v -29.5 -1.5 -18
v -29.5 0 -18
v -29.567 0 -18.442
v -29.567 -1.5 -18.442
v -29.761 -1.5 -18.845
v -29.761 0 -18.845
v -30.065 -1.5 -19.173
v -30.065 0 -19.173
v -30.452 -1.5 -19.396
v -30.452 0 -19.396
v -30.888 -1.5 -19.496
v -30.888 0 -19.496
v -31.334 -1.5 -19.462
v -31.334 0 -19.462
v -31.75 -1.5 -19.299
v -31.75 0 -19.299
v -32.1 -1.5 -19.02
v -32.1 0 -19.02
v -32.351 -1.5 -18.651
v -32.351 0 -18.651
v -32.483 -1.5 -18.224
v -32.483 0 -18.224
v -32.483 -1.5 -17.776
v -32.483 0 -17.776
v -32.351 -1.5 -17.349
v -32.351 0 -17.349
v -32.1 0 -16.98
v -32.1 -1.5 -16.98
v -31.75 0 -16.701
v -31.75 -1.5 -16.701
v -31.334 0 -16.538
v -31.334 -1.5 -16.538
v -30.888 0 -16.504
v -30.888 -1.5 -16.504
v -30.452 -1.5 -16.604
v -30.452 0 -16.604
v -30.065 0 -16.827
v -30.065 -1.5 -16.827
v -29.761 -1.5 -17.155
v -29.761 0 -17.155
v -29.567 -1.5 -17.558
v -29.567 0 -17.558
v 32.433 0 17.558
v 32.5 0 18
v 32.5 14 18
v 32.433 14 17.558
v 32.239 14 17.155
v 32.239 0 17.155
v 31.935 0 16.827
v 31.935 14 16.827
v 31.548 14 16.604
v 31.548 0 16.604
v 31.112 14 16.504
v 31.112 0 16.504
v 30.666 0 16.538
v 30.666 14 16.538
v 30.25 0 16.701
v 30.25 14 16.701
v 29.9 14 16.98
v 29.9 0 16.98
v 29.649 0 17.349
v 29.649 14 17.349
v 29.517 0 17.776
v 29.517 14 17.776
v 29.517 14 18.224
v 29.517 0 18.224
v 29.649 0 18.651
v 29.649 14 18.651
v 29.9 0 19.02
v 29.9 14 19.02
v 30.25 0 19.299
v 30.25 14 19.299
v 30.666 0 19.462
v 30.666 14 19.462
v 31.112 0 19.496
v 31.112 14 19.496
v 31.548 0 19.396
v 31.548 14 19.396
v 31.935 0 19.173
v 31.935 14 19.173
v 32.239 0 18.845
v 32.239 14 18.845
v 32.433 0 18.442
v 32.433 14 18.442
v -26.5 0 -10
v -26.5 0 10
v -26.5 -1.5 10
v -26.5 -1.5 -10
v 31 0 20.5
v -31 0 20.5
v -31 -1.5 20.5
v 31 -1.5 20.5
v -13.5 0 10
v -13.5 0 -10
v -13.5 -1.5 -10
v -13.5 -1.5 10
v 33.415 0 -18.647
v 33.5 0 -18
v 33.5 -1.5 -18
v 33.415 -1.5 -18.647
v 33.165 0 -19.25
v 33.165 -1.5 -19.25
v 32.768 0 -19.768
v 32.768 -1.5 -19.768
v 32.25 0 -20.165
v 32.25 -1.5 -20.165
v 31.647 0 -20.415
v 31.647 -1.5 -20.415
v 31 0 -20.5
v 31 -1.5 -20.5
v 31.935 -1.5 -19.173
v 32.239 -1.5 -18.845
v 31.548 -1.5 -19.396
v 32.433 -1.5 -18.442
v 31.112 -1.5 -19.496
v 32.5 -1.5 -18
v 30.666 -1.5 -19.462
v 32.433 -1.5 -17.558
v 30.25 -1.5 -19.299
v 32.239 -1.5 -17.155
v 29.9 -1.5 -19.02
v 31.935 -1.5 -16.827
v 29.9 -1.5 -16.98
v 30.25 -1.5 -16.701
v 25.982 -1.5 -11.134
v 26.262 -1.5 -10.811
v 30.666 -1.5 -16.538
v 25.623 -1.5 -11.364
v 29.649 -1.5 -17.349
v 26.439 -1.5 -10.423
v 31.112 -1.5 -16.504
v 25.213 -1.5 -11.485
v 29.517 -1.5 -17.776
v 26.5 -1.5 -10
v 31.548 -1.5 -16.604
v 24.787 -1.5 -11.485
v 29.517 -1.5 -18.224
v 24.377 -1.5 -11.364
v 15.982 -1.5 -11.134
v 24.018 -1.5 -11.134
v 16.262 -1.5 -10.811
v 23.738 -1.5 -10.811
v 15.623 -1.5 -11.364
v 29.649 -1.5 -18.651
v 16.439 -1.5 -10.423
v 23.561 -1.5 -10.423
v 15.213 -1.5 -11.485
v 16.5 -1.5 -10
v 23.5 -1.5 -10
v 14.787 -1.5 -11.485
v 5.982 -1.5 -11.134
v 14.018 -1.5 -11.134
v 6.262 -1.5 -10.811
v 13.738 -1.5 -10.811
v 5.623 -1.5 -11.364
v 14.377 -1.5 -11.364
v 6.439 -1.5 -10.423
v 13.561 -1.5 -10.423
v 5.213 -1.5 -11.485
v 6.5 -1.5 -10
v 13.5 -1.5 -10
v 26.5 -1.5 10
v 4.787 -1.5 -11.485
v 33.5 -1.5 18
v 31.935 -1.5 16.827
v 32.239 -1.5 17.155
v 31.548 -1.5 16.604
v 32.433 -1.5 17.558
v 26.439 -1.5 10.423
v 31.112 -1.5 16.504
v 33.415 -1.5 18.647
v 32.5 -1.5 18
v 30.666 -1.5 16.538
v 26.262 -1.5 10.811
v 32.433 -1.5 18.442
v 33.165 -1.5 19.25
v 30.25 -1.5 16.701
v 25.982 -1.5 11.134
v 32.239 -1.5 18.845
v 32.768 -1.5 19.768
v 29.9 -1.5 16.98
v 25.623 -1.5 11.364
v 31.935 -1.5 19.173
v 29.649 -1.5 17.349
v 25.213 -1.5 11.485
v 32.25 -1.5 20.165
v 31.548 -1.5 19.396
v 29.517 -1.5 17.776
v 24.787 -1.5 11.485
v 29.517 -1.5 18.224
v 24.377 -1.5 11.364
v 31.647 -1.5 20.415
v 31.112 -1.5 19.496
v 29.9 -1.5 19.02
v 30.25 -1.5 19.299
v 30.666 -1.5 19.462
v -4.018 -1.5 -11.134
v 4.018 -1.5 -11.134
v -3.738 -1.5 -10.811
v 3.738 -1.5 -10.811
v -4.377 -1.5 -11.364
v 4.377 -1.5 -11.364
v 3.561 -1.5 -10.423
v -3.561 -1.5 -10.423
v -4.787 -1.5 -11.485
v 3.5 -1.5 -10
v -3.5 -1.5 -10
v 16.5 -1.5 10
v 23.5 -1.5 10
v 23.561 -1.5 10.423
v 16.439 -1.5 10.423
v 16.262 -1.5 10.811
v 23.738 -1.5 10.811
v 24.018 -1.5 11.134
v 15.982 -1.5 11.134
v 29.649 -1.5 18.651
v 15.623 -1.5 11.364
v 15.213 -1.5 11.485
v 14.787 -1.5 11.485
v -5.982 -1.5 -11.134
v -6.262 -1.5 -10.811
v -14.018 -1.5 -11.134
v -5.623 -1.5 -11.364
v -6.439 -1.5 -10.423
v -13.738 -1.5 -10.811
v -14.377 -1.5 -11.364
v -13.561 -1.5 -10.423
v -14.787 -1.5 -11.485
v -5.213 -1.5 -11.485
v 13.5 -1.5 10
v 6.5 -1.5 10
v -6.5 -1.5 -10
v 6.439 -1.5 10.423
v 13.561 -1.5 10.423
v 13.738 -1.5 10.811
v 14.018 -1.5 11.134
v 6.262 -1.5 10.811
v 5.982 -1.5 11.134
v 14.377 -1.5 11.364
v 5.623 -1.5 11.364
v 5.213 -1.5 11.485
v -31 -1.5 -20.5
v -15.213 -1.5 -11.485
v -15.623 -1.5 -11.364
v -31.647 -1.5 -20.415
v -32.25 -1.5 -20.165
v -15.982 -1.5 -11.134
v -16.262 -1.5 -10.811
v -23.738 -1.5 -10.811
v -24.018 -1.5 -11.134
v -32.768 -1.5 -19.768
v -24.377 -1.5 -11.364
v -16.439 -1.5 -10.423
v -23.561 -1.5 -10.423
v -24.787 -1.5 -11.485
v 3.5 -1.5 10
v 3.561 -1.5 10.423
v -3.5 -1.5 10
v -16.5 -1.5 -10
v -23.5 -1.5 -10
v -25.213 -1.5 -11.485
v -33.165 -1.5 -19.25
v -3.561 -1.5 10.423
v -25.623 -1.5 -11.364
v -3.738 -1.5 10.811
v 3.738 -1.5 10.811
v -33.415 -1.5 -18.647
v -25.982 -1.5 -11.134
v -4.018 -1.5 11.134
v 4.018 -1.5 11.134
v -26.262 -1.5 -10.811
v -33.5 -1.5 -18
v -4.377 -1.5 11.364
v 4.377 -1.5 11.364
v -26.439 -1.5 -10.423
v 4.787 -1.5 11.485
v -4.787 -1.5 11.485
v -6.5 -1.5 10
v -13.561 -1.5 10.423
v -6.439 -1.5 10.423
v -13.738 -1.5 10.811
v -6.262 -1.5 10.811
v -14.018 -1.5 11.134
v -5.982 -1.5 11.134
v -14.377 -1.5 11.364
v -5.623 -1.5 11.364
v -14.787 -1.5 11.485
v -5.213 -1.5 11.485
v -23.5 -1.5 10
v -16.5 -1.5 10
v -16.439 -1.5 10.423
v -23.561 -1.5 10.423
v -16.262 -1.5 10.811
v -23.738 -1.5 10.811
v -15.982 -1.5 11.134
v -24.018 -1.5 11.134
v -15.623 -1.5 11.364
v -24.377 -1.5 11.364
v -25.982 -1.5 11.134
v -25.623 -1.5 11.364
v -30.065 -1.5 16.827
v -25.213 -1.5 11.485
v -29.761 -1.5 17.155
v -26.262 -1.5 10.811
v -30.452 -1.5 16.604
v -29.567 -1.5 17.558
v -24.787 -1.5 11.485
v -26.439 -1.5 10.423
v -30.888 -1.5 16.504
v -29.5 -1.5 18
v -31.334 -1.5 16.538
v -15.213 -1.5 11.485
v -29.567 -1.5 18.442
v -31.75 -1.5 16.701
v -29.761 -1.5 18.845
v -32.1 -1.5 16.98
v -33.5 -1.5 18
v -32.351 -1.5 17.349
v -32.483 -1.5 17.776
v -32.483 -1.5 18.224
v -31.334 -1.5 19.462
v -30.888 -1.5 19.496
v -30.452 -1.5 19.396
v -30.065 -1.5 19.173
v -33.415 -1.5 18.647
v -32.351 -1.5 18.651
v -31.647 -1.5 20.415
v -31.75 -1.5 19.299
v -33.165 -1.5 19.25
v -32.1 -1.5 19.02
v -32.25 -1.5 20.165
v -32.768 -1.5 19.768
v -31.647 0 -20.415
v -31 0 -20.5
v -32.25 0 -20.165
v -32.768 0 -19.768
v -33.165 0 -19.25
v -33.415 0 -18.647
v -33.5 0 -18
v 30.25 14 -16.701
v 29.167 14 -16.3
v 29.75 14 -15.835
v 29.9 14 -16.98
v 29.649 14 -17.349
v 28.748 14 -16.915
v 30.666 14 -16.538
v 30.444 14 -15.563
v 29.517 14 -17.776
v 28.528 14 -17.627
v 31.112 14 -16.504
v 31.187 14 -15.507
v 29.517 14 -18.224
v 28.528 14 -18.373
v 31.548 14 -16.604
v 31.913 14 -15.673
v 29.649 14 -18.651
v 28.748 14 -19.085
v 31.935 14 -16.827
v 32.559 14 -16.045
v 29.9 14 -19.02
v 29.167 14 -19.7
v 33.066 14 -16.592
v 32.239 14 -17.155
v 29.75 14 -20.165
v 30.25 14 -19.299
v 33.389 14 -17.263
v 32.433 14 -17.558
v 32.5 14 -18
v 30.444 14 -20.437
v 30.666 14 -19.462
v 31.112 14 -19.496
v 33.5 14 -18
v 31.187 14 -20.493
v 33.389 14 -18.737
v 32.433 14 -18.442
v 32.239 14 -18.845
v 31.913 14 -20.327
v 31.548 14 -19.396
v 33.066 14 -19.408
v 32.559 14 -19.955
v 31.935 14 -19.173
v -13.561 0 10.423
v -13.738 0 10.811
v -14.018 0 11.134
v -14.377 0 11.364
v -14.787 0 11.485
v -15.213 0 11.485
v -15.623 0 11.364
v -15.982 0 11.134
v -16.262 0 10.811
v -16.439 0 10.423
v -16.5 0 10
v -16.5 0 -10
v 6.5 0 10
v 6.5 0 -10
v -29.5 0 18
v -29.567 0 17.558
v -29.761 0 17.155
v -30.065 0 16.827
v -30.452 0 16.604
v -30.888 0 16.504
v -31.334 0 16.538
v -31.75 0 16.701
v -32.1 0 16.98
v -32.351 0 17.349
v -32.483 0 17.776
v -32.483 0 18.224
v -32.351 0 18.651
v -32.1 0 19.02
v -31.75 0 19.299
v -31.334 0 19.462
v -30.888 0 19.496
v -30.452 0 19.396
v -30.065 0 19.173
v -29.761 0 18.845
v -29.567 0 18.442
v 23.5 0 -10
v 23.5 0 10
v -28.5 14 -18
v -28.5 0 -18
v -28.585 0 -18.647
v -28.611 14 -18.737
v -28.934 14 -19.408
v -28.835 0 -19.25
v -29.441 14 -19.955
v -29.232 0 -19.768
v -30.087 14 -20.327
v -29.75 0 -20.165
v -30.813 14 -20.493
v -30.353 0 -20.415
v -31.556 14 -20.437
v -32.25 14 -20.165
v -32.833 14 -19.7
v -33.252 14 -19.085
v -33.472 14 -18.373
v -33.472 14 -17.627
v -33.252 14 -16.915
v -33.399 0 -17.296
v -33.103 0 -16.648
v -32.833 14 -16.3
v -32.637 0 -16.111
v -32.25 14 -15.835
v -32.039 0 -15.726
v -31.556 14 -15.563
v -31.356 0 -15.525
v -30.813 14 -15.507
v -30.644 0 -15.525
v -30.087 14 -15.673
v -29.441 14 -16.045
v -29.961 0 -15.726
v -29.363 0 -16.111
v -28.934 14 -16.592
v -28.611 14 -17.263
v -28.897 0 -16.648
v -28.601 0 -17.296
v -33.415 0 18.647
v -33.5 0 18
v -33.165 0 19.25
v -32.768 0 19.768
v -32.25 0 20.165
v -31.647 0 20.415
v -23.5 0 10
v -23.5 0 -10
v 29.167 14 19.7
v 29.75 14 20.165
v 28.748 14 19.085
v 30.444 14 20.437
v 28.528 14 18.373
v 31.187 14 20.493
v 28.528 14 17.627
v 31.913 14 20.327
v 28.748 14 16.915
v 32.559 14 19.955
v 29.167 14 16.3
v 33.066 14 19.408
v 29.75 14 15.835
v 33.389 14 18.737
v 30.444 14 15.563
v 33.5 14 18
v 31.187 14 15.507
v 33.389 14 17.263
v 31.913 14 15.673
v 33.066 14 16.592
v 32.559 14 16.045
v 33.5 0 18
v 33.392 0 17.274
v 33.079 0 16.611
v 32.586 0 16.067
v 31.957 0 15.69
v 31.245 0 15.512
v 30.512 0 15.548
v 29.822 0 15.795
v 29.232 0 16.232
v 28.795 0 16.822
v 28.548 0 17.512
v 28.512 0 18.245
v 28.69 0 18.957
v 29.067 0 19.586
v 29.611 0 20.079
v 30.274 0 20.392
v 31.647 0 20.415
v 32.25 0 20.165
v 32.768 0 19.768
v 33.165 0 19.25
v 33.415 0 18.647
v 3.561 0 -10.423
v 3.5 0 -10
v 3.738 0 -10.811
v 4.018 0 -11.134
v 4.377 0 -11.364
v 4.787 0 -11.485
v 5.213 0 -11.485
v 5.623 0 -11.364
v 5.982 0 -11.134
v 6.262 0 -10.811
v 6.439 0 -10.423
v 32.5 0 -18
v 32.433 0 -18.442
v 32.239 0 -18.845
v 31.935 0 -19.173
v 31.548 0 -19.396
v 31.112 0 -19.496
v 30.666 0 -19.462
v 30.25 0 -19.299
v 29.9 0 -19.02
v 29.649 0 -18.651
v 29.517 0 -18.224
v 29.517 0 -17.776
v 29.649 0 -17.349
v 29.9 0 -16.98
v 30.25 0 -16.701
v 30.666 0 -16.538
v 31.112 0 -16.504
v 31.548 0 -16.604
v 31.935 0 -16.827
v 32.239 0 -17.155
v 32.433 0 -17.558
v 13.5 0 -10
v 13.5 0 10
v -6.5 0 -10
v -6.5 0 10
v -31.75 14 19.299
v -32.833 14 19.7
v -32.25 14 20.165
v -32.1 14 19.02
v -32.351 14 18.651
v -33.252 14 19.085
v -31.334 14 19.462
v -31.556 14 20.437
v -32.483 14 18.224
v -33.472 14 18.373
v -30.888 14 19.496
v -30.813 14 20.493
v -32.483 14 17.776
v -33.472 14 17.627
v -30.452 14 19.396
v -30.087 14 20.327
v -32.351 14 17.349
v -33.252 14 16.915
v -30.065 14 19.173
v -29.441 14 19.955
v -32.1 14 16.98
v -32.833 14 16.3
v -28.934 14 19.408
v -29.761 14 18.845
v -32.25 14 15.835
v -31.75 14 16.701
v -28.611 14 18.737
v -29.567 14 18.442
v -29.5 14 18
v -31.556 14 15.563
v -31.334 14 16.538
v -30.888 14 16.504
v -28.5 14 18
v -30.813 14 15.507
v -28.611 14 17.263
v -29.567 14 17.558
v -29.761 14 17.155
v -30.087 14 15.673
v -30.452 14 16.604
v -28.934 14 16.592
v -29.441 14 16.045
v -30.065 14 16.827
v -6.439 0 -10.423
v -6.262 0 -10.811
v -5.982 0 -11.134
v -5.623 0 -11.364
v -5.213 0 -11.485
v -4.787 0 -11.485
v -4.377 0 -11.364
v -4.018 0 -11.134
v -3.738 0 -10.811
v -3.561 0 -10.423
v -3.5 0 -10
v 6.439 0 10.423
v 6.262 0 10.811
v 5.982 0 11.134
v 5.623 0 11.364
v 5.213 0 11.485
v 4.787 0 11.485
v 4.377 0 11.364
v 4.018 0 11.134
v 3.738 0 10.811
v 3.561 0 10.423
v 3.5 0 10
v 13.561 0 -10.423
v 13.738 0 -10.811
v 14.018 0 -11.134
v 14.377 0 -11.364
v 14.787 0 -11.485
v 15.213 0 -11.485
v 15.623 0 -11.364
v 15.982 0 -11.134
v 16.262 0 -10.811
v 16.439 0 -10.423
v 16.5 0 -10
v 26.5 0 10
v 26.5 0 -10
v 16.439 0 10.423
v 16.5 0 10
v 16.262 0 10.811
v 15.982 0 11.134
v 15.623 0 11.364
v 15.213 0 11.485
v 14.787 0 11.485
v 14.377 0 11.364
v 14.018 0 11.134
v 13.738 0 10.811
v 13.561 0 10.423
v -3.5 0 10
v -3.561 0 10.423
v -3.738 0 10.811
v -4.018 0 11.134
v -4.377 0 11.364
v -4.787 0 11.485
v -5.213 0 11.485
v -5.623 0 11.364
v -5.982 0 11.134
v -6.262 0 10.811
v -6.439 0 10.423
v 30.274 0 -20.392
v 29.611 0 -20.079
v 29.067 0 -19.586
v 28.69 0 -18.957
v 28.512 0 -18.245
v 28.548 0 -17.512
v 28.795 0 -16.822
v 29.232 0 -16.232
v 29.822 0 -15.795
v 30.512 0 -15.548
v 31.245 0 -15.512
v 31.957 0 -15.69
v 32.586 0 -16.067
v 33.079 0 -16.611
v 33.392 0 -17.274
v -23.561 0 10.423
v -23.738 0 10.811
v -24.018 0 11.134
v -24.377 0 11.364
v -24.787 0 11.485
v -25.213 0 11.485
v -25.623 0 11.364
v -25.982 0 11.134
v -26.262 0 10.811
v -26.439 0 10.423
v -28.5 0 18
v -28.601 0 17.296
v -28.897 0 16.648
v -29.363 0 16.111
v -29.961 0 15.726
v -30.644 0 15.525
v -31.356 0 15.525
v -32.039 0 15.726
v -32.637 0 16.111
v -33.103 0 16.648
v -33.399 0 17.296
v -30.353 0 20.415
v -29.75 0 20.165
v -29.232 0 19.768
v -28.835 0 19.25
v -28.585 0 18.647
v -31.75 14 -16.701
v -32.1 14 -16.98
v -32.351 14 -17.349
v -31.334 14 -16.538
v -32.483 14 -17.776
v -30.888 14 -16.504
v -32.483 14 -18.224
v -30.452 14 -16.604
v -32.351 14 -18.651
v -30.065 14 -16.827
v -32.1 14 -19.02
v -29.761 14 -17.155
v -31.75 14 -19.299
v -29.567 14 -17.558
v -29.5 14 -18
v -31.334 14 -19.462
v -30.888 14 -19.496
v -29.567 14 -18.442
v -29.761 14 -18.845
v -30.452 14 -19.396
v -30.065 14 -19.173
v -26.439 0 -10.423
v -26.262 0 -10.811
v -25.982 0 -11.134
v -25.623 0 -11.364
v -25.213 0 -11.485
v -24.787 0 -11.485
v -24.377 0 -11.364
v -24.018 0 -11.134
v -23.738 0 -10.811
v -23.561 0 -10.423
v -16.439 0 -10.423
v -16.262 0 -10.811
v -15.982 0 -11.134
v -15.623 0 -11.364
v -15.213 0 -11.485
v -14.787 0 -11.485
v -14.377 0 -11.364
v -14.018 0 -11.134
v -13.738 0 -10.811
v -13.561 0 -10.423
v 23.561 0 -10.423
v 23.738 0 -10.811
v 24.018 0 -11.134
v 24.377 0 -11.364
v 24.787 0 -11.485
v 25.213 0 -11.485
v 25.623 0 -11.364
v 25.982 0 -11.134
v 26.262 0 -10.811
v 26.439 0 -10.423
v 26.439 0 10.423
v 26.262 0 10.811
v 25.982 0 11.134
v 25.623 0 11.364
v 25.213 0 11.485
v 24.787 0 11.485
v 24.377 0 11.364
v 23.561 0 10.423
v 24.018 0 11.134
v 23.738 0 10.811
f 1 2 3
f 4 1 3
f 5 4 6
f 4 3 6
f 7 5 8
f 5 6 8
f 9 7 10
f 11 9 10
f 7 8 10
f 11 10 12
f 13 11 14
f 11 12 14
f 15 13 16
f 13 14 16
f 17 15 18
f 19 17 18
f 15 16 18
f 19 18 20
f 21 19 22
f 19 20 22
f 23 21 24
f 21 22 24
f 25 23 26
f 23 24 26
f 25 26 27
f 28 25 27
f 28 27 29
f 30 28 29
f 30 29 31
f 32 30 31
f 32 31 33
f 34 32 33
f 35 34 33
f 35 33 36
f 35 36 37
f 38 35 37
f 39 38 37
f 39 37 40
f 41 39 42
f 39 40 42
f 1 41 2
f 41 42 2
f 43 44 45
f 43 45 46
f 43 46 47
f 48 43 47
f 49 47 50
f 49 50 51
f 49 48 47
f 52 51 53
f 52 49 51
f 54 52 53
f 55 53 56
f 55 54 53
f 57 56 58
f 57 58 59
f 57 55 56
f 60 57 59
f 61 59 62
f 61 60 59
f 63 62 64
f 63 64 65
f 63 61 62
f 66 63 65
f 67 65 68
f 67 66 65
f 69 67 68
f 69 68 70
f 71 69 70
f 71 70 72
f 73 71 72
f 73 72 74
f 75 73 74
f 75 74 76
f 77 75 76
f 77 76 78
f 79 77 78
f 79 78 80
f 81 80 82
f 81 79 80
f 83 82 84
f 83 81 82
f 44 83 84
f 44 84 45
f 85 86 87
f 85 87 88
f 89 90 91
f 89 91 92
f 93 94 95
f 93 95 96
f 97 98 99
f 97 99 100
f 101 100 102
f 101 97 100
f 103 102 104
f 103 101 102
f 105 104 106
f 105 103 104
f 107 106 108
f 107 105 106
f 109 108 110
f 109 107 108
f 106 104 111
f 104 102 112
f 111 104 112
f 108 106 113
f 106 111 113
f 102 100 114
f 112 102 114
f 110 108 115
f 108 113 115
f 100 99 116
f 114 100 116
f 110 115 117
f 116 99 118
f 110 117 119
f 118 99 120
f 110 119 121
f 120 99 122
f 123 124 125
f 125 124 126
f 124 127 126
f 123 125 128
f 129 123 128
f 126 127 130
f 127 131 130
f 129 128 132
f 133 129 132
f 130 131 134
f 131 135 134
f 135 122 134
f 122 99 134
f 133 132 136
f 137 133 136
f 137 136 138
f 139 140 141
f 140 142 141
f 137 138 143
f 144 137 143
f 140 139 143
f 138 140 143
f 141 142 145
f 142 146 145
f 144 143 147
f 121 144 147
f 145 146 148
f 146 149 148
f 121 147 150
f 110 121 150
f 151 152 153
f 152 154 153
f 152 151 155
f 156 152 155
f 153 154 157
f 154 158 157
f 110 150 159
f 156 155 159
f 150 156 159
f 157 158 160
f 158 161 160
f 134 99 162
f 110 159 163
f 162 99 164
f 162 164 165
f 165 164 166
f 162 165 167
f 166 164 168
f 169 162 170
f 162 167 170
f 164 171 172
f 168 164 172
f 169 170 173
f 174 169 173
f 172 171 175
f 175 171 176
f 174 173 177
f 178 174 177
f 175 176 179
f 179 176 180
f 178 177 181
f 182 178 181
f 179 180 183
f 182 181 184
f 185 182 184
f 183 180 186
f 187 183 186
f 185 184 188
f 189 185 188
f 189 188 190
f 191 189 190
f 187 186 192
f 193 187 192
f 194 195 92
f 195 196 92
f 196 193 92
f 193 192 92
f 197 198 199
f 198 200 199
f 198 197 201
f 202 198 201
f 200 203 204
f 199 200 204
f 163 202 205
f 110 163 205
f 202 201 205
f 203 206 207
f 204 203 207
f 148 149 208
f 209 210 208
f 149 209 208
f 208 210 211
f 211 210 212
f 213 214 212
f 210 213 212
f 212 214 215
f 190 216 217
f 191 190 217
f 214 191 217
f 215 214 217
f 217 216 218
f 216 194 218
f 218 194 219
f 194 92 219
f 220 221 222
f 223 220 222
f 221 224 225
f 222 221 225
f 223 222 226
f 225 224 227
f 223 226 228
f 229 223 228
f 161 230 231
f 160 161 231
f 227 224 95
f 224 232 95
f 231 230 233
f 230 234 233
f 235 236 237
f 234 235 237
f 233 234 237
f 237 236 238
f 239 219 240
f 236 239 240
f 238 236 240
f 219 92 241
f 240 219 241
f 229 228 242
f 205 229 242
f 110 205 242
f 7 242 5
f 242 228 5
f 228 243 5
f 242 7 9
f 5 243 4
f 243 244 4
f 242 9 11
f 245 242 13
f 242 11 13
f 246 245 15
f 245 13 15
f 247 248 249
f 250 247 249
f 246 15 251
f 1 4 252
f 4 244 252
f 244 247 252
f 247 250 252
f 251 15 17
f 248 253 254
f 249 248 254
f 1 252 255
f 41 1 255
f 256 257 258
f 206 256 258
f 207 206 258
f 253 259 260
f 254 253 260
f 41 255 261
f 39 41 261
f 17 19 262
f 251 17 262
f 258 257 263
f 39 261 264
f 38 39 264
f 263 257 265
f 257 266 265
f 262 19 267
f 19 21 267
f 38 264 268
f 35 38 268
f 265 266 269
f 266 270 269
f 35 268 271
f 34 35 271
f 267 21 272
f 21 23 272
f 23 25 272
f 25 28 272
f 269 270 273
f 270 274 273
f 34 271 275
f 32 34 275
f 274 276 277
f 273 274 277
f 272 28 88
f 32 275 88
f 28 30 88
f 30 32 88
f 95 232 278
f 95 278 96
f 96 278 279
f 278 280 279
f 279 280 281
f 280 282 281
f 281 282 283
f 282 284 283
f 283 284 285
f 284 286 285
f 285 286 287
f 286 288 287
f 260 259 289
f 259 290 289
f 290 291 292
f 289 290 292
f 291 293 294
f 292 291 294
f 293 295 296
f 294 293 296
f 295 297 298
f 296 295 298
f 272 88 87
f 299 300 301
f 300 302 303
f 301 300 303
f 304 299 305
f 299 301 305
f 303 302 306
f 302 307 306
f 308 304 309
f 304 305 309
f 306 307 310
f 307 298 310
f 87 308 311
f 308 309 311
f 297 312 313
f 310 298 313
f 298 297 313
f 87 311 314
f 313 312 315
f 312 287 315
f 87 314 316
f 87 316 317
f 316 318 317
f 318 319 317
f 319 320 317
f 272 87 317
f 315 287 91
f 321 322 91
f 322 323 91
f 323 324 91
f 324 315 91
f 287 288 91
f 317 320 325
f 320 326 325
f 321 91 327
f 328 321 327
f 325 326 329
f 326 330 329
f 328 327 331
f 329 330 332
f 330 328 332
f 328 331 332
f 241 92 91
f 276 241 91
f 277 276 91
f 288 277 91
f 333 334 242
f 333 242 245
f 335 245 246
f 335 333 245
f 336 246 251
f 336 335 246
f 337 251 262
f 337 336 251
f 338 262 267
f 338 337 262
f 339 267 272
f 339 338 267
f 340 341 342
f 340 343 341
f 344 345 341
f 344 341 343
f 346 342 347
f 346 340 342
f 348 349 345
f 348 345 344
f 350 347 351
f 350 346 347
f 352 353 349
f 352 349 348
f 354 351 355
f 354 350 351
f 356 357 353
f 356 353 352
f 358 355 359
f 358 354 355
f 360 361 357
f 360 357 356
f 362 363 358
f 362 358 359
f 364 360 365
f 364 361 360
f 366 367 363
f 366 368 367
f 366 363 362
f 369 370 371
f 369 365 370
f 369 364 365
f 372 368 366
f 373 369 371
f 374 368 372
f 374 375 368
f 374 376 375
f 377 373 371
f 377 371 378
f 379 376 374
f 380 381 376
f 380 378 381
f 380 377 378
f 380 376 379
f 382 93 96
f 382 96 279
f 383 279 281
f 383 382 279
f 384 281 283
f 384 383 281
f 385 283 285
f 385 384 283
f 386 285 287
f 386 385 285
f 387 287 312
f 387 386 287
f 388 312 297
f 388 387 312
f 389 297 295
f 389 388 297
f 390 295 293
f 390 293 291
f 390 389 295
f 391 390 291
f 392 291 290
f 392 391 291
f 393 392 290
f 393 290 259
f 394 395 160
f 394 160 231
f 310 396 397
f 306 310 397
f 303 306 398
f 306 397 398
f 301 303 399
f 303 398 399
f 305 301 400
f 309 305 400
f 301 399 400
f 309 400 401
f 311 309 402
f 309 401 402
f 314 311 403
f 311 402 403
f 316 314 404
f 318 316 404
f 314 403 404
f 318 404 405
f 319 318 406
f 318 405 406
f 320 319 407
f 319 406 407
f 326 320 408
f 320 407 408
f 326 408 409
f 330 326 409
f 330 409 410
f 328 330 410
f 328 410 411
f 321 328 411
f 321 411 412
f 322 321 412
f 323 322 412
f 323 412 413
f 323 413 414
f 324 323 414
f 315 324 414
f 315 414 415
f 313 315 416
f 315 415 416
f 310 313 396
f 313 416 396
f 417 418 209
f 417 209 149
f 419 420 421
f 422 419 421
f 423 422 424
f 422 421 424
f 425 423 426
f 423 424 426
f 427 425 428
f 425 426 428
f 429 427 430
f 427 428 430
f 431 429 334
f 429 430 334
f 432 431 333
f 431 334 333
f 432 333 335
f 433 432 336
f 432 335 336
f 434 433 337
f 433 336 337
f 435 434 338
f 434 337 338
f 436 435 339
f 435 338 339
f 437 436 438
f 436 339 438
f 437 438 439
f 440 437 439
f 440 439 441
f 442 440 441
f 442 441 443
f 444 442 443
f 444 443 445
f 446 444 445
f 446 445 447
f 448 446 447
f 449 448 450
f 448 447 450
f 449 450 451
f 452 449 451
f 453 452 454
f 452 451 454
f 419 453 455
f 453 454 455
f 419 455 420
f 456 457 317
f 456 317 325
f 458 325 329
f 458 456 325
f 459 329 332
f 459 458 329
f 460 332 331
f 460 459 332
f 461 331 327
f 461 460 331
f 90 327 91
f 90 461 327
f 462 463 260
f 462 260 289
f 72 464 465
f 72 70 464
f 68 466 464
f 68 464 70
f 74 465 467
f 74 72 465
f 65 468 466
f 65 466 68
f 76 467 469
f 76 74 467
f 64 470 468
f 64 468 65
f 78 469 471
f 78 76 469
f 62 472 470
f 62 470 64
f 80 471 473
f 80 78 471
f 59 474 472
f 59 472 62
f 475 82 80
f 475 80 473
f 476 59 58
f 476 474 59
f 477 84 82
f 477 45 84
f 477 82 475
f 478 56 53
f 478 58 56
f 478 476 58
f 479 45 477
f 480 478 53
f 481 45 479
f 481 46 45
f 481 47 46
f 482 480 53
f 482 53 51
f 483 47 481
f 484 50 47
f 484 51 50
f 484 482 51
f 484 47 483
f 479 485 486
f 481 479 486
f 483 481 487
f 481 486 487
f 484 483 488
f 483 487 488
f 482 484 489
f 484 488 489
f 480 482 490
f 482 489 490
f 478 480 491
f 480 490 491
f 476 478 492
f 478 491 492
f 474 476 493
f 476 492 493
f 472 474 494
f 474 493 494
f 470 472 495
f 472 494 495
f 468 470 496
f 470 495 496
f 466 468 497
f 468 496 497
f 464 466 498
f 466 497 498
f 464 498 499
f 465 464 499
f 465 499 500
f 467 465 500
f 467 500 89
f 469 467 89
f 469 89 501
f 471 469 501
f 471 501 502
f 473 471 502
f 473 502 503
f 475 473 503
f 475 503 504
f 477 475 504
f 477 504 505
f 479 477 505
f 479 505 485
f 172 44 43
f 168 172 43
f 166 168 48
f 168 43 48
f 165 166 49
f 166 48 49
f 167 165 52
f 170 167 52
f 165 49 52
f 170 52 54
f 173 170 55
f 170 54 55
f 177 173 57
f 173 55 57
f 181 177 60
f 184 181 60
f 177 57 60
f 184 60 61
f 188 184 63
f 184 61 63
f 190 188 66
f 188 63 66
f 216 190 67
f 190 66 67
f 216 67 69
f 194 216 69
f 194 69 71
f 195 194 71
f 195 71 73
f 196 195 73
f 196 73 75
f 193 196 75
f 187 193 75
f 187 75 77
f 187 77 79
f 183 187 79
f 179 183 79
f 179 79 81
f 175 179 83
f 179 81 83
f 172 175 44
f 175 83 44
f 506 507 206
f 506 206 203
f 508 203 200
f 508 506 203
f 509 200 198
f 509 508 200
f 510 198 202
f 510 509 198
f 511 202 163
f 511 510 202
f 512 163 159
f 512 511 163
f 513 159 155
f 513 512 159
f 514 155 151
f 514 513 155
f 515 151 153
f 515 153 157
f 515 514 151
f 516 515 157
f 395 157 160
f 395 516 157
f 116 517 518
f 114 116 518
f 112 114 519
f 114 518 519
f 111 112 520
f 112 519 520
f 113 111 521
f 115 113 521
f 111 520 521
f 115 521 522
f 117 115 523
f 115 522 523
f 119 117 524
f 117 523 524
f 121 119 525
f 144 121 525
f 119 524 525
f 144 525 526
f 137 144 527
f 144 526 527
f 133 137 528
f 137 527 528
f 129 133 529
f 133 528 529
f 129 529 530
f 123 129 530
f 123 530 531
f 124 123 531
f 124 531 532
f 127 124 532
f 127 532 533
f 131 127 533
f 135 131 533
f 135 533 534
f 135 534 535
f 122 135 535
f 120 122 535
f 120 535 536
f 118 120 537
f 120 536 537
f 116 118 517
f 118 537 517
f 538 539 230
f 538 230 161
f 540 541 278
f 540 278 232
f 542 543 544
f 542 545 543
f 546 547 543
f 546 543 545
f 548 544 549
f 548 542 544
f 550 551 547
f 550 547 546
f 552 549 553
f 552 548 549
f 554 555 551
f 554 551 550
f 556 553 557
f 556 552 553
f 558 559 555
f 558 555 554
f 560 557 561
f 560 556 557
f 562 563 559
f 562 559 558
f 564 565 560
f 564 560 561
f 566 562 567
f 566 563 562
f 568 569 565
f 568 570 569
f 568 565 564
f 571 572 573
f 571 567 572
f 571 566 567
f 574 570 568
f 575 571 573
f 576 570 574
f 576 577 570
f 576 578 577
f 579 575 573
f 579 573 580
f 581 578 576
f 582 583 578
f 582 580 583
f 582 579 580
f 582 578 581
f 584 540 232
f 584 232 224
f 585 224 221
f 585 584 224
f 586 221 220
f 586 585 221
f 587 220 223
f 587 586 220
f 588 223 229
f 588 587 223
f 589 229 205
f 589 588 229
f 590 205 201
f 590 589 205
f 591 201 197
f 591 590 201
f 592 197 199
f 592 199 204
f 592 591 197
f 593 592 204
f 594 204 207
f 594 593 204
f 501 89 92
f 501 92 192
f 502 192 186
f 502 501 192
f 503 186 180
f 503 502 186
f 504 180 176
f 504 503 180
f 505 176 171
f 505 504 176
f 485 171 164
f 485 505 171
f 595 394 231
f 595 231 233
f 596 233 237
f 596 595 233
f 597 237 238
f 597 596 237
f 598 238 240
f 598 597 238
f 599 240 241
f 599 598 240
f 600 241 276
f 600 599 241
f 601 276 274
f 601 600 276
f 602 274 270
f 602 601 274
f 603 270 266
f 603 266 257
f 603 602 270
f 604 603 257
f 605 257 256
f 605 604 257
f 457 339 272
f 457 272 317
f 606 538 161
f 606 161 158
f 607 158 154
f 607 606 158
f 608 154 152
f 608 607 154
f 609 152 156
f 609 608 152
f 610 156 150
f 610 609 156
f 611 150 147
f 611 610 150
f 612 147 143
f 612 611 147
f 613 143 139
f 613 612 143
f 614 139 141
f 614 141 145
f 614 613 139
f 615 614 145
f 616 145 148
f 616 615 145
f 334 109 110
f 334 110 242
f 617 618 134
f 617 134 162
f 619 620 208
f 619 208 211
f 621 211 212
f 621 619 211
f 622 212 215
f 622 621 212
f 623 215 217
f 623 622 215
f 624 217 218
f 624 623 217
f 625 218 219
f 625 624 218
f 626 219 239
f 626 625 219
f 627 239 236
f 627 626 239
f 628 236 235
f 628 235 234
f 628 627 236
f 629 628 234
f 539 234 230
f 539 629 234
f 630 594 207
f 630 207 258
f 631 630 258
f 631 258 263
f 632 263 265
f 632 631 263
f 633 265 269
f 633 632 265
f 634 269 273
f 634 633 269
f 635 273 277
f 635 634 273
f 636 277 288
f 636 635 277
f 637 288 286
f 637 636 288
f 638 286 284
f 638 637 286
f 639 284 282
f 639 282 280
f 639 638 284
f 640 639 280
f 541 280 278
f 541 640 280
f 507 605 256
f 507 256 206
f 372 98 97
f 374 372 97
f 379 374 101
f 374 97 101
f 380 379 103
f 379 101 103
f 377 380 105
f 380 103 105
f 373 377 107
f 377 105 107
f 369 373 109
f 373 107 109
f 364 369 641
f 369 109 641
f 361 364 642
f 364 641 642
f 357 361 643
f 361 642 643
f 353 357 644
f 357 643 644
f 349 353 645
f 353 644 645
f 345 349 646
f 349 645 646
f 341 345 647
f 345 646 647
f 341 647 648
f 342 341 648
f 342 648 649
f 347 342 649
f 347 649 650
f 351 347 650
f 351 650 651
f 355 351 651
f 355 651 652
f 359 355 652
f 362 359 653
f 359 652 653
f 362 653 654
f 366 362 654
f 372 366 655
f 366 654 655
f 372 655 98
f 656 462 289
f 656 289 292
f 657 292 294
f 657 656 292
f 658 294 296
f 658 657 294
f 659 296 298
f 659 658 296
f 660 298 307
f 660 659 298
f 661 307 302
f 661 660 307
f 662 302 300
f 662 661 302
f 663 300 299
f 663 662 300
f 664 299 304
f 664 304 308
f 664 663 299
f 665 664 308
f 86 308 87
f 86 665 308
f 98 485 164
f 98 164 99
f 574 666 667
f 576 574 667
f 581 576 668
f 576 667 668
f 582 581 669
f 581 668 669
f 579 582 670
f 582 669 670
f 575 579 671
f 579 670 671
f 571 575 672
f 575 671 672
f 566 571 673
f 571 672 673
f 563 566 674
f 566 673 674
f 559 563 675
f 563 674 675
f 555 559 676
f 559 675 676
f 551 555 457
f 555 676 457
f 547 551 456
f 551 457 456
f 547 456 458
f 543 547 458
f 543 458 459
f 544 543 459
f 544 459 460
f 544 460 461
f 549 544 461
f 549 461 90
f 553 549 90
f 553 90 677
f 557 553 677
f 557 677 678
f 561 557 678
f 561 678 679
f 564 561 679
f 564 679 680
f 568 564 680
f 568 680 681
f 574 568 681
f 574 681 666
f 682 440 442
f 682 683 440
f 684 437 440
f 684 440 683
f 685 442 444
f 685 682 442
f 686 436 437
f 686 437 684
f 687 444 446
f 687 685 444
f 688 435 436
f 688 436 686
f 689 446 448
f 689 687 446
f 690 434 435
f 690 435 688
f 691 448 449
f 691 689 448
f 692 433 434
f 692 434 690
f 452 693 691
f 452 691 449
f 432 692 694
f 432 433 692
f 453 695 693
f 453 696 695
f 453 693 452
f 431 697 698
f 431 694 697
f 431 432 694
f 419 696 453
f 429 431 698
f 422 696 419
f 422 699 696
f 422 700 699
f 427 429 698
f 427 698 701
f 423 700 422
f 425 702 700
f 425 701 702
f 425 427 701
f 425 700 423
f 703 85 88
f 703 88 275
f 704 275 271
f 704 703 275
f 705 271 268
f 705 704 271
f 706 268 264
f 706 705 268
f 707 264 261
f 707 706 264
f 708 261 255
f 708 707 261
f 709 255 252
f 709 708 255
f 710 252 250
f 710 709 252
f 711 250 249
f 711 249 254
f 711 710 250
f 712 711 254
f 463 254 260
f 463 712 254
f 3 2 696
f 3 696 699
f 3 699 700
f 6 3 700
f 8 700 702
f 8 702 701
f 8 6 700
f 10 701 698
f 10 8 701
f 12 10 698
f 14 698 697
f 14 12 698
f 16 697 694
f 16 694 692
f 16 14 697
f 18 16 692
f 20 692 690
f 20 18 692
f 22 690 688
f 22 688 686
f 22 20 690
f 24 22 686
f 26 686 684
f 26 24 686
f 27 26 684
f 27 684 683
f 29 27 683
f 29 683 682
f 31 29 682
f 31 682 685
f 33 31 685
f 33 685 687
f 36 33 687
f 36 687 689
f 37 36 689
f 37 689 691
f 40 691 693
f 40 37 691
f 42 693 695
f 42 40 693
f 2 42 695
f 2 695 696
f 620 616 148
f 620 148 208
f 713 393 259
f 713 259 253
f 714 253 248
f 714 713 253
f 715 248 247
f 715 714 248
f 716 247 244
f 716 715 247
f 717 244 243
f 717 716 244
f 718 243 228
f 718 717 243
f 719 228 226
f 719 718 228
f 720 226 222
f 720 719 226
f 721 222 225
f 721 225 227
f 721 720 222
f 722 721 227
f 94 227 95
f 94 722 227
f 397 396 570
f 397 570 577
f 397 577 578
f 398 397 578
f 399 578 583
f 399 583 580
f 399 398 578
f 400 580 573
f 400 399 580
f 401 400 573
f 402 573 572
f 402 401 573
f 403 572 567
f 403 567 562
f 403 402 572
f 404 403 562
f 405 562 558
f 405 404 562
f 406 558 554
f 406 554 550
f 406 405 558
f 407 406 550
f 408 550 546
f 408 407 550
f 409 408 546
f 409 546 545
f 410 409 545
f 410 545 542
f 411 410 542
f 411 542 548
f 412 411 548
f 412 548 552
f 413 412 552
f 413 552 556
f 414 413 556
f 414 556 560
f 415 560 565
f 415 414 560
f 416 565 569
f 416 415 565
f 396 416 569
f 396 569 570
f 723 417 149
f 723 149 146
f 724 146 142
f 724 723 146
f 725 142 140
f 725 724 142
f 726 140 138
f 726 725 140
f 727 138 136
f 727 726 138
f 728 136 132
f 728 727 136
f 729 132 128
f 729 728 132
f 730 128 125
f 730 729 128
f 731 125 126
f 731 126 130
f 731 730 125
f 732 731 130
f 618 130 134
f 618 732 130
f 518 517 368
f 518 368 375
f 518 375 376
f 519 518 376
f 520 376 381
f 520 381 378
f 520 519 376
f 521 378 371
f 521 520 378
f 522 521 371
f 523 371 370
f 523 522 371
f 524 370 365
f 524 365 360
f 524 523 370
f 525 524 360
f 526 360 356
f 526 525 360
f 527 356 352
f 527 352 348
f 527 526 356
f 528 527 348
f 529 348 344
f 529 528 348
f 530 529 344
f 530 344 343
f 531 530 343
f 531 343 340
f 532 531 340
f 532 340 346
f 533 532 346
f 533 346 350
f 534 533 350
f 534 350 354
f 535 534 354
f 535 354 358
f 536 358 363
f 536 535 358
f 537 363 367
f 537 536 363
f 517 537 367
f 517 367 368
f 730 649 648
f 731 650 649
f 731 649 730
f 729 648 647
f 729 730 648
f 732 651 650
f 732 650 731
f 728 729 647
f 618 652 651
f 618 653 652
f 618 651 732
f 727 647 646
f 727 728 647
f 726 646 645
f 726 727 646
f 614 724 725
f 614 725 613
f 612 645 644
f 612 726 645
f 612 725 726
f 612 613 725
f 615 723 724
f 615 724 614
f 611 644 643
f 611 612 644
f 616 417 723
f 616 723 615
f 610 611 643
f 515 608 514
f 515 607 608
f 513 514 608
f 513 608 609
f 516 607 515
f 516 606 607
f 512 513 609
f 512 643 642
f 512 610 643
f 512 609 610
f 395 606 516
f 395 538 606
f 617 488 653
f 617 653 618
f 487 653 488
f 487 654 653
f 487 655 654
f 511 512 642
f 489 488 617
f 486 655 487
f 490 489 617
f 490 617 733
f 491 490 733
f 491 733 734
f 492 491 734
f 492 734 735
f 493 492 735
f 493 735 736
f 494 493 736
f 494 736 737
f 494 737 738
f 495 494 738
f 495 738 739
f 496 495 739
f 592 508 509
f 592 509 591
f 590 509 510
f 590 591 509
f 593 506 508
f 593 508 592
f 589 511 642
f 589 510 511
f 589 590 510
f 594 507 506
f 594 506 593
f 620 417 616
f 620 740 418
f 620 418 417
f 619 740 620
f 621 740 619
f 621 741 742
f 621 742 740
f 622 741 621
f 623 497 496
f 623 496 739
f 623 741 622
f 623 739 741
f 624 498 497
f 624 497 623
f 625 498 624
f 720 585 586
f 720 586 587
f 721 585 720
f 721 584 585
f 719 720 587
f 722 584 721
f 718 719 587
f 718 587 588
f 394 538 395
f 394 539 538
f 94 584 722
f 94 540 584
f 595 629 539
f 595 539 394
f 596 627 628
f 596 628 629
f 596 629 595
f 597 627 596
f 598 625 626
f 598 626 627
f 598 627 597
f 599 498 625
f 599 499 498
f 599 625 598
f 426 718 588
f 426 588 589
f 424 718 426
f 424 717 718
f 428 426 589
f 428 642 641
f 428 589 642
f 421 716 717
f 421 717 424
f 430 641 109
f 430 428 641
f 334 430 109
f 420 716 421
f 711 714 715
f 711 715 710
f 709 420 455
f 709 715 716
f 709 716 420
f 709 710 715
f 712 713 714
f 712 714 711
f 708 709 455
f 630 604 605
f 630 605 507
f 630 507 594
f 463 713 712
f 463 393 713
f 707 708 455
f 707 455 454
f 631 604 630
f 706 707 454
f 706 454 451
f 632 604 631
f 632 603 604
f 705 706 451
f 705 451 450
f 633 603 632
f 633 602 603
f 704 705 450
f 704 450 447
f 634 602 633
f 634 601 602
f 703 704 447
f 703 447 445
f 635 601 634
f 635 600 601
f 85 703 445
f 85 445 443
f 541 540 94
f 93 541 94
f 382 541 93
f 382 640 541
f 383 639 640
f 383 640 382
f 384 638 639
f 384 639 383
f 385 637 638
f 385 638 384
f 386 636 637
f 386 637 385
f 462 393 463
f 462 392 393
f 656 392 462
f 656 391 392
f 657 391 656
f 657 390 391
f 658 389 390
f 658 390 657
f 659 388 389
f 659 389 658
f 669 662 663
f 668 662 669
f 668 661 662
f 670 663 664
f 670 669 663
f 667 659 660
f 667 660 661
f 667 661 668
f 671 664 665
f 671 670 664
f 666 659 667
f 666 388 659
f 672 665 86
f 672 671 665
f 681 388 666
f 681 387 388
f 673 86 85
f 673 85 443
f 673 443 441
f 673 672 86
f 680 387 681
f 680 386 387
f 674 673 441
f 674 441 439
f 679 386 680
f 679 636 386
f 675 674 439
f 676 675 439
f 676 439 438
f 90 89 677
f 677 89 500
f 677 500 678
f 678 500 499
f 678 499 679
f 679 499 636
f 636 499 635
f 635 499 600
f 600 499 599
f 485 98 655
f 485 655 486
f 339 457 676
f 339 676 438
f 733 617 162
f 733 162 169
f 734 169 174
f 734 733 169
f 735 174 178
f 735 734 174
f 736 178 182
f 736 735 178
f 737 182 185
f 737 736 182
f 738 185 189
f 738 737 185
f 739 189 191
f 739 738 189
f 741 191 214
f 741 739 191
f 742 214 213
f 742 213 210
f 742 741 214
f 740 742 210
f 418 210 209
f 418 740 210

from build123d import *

# Parameters (mm, degrees)
SKETCH3_R             = 2.5
SKETCH3_R_2           = 1.5
BOSS_EXTRUDE2_DEPTH   = 14
BOSS_EXTRUDE2_2_DEPTH = 14
BOSS_EXTRUDE2_3_DEPTH = 14
BOSS_EXTRUDE2_4_DEPTH = 14
BOSS_EXTRUDE3_DEPTH   = 1.5
SKETCH5_R             = 1.5
CUT_EXTRUDE1_DEPTH    = 1.5
CUT_EXTRUDE2_DEPTH    = 1.5


with BuildPart() as part:
    # Sketch3 → Boss-Extrude2 (new body)
    with BuildSketch(Plane(origin=(0, 0, 0), x_dir=(1, 0, 0), z_dir=(0, 1, 0))):
        with Locations((-31, 18)):
            Circle(SKETCH3_R)
        with Locations((-31, 18)):
            Circle(SKETCH3_R_2, mode=Mode.SUBTRACT)
    extrude(amount=BOSS_EXTRUDE2_DEPTH)



with BuildPart() as body_2:
    # Sketch3 → Boss-Extrude2 2 (new body)
    with BuildSketch(Plane(origin=(0, 0, 0), x_dir=(1, 0, 0), z_dir=(0, 1, 0))):
        with Locations((31, 18)):
            Circle(SKETCH3_R)
        with Locations((31, 18)):
            Circle(SKETCH3_R_2, mode=Mode.SUBTRACT)
    extrude(amount=BOSS_EXTRUDE2_2_DEPTH)


with BuildPart() as body_3:
    # Sketch3 → Boss-Extrude2 3 (new body)
    with BuildSketch(Plane(origin=(0, 0, 0), x_dir=(1, 0, 0), z_dir=(0, 1, 0))):
        with Locations((31, -18)):
            Circle(SKETCH3_R)
        with Locations((31, -18)):
            Circle(SKETCH3_R_2, mode=Mode.SUBTRACT)
    extrude(amount=BOSS_EXTRUDE2_3_DEPTH)


with BuildPart() as body_4:
    # Sketch3 → Boss-Extrude2 4 (new body)
    with BuildSketch(Plane(origin=(0, 0, 0), x_dir=(1, 0, 0), z_dir=(0, 1, 0))):
        with Locations((-31, -18)):
            Circle(SKETCH3_R)
        with Locations((-31, -18)):
            Circle(SKETCH3_R_2, mode=Mode.SUBTRACT)
    extrude(amount=BOSS_EXTRUDE2_4_DEPTH)


with BuildPart() as part_1:
    add(part.part)

    add(body_2.part)  # Boss-Extrude3 merges body 2

    add(body_3.part)  # Boss-Extrude3 merges body 3

    add(body_4.part)  # Boss-Extrude3 merges body 4
    # Sketch4 → Boss-Extrude3 (add)
    with BuildSketch(Plane.XZ):
        with BuildLine():
            Line((-31, 20.5), (31, 20.5))
            ThreePointArc((31, 20.5), (32.767766953, 19.767766953), (33.5, 18))
            Line((33.5, 18), (33.5, -18))
            ThreePointArc((33.5, -18), (32.767766953, -19.767766953), (31, -20.5))
            Line((31, -20.5), (-31, -20.5))
            ThreePointArc((-31, -20.5), (-32.767766953, -19.767766953), (-33.5, -18))
            Line((-33.5, -18), (-33.5, 18))
            ThreePointArc((-33.5, 18), (-32.767766953, 19.767766953), (-31, 20.5))
        make_face()
    extrude(amount=BOSS_EXTRUDE3_DEPTH)

    # Sketch5 → Cut-Extrude1 (cut)
    with BuildSketch(Plane(origin=(0, 0, 0), x_dir=(1, 0, 0), z_dir=(0, 1, 0))):
        with Locations((31, 18)):
            Circle(SKETCH5_R)
        with Locations((-31, 18)):
            Circle(SKETCH5_R)
        with Locations((-31, -18)):
            Circle(SKETCH5_R)
        with Locations((31, -18)):
            Circle(SKETCH5_R)
    extrude(amount=-CUT_EXTRUDE1_DEPTH, mode=Mode.SUBTRACT)

    # Sketch6 → Cut-Extrude2 (cut)
    with BuildSketch(Plane(origin=(0, 0, 0), x_dir=(1, 0, 0), z_dir=(0, 1, 0))):
        with BuildLine():
            Line((-23.5, 10), (-23.5, -10))
            ThreePointArc((-23.5, -10), (-25, -11.5), (-26.5, -10))
            Line((-26.5, -10), (-26.5, 10))
            ThreePointArc((-26.5, 10), (-25, 11.5), (-23.5, 10))
        make_face()
        with BuildLine():
            Line((-13.5, 10), (-13.5, -10))
            ThreePointArc((-13.5, -10), (-15, -11.5), (-16.5, -10))
            Line((-16.5, -10), (-16.5, 10))
            ThreePointArc((-16.5, 10), (-15, 11.5), (-13.5, 10))
        make_face()
        with BuildLine():
            Line((-3.5, 10), (-3.5, -10))
            ThreePointArc((-3.5, -10), (-5, -11.5), (-6.5, -10))
            Line((-6.5, -10), (-6.5, 10))
            ThreePointArc((-6.5, 10), (-5, 11.5), (-3.5, 10))
        make_face()
        with BuildLine():
            Line((6.5, 10), (6.5, -10))
            ThreePointArc((6.5, -10), (5, -11.5), (3.5, -10))
            Line((3.5, -10), (3.5, 10))
            ThreePointArc((3.5, 10), (5, 11.5), (6.5, 10))
        make_face()
        with BuildLine():
            Line((16.5, 10), (16.5, -10))
            ThreePointArc((16.5, -10), (15, -11.5), (13.5, -10))
            Line((13.5, -10), (13.5, 10))
            ThreePointArc((13.5, 10), (15, 11.5), (16.5, 10))
        make_face()
        with BuildLine():
            Line((26.5, 10), (26.5, -10))
            ThreePointArc((26.5, -10), (25, -11.5), (23.5, -10))
            Line((23.5, -10), (23.5, 10))
            ThreePointArc((23.5, 10), (25, 11.5), (26.5, 10))
        make_face()
    extrude(amount=-CUT_EXTRUDE2_DEPTH, mode=Mode.SUBTRACT)


solid = part_1.part
